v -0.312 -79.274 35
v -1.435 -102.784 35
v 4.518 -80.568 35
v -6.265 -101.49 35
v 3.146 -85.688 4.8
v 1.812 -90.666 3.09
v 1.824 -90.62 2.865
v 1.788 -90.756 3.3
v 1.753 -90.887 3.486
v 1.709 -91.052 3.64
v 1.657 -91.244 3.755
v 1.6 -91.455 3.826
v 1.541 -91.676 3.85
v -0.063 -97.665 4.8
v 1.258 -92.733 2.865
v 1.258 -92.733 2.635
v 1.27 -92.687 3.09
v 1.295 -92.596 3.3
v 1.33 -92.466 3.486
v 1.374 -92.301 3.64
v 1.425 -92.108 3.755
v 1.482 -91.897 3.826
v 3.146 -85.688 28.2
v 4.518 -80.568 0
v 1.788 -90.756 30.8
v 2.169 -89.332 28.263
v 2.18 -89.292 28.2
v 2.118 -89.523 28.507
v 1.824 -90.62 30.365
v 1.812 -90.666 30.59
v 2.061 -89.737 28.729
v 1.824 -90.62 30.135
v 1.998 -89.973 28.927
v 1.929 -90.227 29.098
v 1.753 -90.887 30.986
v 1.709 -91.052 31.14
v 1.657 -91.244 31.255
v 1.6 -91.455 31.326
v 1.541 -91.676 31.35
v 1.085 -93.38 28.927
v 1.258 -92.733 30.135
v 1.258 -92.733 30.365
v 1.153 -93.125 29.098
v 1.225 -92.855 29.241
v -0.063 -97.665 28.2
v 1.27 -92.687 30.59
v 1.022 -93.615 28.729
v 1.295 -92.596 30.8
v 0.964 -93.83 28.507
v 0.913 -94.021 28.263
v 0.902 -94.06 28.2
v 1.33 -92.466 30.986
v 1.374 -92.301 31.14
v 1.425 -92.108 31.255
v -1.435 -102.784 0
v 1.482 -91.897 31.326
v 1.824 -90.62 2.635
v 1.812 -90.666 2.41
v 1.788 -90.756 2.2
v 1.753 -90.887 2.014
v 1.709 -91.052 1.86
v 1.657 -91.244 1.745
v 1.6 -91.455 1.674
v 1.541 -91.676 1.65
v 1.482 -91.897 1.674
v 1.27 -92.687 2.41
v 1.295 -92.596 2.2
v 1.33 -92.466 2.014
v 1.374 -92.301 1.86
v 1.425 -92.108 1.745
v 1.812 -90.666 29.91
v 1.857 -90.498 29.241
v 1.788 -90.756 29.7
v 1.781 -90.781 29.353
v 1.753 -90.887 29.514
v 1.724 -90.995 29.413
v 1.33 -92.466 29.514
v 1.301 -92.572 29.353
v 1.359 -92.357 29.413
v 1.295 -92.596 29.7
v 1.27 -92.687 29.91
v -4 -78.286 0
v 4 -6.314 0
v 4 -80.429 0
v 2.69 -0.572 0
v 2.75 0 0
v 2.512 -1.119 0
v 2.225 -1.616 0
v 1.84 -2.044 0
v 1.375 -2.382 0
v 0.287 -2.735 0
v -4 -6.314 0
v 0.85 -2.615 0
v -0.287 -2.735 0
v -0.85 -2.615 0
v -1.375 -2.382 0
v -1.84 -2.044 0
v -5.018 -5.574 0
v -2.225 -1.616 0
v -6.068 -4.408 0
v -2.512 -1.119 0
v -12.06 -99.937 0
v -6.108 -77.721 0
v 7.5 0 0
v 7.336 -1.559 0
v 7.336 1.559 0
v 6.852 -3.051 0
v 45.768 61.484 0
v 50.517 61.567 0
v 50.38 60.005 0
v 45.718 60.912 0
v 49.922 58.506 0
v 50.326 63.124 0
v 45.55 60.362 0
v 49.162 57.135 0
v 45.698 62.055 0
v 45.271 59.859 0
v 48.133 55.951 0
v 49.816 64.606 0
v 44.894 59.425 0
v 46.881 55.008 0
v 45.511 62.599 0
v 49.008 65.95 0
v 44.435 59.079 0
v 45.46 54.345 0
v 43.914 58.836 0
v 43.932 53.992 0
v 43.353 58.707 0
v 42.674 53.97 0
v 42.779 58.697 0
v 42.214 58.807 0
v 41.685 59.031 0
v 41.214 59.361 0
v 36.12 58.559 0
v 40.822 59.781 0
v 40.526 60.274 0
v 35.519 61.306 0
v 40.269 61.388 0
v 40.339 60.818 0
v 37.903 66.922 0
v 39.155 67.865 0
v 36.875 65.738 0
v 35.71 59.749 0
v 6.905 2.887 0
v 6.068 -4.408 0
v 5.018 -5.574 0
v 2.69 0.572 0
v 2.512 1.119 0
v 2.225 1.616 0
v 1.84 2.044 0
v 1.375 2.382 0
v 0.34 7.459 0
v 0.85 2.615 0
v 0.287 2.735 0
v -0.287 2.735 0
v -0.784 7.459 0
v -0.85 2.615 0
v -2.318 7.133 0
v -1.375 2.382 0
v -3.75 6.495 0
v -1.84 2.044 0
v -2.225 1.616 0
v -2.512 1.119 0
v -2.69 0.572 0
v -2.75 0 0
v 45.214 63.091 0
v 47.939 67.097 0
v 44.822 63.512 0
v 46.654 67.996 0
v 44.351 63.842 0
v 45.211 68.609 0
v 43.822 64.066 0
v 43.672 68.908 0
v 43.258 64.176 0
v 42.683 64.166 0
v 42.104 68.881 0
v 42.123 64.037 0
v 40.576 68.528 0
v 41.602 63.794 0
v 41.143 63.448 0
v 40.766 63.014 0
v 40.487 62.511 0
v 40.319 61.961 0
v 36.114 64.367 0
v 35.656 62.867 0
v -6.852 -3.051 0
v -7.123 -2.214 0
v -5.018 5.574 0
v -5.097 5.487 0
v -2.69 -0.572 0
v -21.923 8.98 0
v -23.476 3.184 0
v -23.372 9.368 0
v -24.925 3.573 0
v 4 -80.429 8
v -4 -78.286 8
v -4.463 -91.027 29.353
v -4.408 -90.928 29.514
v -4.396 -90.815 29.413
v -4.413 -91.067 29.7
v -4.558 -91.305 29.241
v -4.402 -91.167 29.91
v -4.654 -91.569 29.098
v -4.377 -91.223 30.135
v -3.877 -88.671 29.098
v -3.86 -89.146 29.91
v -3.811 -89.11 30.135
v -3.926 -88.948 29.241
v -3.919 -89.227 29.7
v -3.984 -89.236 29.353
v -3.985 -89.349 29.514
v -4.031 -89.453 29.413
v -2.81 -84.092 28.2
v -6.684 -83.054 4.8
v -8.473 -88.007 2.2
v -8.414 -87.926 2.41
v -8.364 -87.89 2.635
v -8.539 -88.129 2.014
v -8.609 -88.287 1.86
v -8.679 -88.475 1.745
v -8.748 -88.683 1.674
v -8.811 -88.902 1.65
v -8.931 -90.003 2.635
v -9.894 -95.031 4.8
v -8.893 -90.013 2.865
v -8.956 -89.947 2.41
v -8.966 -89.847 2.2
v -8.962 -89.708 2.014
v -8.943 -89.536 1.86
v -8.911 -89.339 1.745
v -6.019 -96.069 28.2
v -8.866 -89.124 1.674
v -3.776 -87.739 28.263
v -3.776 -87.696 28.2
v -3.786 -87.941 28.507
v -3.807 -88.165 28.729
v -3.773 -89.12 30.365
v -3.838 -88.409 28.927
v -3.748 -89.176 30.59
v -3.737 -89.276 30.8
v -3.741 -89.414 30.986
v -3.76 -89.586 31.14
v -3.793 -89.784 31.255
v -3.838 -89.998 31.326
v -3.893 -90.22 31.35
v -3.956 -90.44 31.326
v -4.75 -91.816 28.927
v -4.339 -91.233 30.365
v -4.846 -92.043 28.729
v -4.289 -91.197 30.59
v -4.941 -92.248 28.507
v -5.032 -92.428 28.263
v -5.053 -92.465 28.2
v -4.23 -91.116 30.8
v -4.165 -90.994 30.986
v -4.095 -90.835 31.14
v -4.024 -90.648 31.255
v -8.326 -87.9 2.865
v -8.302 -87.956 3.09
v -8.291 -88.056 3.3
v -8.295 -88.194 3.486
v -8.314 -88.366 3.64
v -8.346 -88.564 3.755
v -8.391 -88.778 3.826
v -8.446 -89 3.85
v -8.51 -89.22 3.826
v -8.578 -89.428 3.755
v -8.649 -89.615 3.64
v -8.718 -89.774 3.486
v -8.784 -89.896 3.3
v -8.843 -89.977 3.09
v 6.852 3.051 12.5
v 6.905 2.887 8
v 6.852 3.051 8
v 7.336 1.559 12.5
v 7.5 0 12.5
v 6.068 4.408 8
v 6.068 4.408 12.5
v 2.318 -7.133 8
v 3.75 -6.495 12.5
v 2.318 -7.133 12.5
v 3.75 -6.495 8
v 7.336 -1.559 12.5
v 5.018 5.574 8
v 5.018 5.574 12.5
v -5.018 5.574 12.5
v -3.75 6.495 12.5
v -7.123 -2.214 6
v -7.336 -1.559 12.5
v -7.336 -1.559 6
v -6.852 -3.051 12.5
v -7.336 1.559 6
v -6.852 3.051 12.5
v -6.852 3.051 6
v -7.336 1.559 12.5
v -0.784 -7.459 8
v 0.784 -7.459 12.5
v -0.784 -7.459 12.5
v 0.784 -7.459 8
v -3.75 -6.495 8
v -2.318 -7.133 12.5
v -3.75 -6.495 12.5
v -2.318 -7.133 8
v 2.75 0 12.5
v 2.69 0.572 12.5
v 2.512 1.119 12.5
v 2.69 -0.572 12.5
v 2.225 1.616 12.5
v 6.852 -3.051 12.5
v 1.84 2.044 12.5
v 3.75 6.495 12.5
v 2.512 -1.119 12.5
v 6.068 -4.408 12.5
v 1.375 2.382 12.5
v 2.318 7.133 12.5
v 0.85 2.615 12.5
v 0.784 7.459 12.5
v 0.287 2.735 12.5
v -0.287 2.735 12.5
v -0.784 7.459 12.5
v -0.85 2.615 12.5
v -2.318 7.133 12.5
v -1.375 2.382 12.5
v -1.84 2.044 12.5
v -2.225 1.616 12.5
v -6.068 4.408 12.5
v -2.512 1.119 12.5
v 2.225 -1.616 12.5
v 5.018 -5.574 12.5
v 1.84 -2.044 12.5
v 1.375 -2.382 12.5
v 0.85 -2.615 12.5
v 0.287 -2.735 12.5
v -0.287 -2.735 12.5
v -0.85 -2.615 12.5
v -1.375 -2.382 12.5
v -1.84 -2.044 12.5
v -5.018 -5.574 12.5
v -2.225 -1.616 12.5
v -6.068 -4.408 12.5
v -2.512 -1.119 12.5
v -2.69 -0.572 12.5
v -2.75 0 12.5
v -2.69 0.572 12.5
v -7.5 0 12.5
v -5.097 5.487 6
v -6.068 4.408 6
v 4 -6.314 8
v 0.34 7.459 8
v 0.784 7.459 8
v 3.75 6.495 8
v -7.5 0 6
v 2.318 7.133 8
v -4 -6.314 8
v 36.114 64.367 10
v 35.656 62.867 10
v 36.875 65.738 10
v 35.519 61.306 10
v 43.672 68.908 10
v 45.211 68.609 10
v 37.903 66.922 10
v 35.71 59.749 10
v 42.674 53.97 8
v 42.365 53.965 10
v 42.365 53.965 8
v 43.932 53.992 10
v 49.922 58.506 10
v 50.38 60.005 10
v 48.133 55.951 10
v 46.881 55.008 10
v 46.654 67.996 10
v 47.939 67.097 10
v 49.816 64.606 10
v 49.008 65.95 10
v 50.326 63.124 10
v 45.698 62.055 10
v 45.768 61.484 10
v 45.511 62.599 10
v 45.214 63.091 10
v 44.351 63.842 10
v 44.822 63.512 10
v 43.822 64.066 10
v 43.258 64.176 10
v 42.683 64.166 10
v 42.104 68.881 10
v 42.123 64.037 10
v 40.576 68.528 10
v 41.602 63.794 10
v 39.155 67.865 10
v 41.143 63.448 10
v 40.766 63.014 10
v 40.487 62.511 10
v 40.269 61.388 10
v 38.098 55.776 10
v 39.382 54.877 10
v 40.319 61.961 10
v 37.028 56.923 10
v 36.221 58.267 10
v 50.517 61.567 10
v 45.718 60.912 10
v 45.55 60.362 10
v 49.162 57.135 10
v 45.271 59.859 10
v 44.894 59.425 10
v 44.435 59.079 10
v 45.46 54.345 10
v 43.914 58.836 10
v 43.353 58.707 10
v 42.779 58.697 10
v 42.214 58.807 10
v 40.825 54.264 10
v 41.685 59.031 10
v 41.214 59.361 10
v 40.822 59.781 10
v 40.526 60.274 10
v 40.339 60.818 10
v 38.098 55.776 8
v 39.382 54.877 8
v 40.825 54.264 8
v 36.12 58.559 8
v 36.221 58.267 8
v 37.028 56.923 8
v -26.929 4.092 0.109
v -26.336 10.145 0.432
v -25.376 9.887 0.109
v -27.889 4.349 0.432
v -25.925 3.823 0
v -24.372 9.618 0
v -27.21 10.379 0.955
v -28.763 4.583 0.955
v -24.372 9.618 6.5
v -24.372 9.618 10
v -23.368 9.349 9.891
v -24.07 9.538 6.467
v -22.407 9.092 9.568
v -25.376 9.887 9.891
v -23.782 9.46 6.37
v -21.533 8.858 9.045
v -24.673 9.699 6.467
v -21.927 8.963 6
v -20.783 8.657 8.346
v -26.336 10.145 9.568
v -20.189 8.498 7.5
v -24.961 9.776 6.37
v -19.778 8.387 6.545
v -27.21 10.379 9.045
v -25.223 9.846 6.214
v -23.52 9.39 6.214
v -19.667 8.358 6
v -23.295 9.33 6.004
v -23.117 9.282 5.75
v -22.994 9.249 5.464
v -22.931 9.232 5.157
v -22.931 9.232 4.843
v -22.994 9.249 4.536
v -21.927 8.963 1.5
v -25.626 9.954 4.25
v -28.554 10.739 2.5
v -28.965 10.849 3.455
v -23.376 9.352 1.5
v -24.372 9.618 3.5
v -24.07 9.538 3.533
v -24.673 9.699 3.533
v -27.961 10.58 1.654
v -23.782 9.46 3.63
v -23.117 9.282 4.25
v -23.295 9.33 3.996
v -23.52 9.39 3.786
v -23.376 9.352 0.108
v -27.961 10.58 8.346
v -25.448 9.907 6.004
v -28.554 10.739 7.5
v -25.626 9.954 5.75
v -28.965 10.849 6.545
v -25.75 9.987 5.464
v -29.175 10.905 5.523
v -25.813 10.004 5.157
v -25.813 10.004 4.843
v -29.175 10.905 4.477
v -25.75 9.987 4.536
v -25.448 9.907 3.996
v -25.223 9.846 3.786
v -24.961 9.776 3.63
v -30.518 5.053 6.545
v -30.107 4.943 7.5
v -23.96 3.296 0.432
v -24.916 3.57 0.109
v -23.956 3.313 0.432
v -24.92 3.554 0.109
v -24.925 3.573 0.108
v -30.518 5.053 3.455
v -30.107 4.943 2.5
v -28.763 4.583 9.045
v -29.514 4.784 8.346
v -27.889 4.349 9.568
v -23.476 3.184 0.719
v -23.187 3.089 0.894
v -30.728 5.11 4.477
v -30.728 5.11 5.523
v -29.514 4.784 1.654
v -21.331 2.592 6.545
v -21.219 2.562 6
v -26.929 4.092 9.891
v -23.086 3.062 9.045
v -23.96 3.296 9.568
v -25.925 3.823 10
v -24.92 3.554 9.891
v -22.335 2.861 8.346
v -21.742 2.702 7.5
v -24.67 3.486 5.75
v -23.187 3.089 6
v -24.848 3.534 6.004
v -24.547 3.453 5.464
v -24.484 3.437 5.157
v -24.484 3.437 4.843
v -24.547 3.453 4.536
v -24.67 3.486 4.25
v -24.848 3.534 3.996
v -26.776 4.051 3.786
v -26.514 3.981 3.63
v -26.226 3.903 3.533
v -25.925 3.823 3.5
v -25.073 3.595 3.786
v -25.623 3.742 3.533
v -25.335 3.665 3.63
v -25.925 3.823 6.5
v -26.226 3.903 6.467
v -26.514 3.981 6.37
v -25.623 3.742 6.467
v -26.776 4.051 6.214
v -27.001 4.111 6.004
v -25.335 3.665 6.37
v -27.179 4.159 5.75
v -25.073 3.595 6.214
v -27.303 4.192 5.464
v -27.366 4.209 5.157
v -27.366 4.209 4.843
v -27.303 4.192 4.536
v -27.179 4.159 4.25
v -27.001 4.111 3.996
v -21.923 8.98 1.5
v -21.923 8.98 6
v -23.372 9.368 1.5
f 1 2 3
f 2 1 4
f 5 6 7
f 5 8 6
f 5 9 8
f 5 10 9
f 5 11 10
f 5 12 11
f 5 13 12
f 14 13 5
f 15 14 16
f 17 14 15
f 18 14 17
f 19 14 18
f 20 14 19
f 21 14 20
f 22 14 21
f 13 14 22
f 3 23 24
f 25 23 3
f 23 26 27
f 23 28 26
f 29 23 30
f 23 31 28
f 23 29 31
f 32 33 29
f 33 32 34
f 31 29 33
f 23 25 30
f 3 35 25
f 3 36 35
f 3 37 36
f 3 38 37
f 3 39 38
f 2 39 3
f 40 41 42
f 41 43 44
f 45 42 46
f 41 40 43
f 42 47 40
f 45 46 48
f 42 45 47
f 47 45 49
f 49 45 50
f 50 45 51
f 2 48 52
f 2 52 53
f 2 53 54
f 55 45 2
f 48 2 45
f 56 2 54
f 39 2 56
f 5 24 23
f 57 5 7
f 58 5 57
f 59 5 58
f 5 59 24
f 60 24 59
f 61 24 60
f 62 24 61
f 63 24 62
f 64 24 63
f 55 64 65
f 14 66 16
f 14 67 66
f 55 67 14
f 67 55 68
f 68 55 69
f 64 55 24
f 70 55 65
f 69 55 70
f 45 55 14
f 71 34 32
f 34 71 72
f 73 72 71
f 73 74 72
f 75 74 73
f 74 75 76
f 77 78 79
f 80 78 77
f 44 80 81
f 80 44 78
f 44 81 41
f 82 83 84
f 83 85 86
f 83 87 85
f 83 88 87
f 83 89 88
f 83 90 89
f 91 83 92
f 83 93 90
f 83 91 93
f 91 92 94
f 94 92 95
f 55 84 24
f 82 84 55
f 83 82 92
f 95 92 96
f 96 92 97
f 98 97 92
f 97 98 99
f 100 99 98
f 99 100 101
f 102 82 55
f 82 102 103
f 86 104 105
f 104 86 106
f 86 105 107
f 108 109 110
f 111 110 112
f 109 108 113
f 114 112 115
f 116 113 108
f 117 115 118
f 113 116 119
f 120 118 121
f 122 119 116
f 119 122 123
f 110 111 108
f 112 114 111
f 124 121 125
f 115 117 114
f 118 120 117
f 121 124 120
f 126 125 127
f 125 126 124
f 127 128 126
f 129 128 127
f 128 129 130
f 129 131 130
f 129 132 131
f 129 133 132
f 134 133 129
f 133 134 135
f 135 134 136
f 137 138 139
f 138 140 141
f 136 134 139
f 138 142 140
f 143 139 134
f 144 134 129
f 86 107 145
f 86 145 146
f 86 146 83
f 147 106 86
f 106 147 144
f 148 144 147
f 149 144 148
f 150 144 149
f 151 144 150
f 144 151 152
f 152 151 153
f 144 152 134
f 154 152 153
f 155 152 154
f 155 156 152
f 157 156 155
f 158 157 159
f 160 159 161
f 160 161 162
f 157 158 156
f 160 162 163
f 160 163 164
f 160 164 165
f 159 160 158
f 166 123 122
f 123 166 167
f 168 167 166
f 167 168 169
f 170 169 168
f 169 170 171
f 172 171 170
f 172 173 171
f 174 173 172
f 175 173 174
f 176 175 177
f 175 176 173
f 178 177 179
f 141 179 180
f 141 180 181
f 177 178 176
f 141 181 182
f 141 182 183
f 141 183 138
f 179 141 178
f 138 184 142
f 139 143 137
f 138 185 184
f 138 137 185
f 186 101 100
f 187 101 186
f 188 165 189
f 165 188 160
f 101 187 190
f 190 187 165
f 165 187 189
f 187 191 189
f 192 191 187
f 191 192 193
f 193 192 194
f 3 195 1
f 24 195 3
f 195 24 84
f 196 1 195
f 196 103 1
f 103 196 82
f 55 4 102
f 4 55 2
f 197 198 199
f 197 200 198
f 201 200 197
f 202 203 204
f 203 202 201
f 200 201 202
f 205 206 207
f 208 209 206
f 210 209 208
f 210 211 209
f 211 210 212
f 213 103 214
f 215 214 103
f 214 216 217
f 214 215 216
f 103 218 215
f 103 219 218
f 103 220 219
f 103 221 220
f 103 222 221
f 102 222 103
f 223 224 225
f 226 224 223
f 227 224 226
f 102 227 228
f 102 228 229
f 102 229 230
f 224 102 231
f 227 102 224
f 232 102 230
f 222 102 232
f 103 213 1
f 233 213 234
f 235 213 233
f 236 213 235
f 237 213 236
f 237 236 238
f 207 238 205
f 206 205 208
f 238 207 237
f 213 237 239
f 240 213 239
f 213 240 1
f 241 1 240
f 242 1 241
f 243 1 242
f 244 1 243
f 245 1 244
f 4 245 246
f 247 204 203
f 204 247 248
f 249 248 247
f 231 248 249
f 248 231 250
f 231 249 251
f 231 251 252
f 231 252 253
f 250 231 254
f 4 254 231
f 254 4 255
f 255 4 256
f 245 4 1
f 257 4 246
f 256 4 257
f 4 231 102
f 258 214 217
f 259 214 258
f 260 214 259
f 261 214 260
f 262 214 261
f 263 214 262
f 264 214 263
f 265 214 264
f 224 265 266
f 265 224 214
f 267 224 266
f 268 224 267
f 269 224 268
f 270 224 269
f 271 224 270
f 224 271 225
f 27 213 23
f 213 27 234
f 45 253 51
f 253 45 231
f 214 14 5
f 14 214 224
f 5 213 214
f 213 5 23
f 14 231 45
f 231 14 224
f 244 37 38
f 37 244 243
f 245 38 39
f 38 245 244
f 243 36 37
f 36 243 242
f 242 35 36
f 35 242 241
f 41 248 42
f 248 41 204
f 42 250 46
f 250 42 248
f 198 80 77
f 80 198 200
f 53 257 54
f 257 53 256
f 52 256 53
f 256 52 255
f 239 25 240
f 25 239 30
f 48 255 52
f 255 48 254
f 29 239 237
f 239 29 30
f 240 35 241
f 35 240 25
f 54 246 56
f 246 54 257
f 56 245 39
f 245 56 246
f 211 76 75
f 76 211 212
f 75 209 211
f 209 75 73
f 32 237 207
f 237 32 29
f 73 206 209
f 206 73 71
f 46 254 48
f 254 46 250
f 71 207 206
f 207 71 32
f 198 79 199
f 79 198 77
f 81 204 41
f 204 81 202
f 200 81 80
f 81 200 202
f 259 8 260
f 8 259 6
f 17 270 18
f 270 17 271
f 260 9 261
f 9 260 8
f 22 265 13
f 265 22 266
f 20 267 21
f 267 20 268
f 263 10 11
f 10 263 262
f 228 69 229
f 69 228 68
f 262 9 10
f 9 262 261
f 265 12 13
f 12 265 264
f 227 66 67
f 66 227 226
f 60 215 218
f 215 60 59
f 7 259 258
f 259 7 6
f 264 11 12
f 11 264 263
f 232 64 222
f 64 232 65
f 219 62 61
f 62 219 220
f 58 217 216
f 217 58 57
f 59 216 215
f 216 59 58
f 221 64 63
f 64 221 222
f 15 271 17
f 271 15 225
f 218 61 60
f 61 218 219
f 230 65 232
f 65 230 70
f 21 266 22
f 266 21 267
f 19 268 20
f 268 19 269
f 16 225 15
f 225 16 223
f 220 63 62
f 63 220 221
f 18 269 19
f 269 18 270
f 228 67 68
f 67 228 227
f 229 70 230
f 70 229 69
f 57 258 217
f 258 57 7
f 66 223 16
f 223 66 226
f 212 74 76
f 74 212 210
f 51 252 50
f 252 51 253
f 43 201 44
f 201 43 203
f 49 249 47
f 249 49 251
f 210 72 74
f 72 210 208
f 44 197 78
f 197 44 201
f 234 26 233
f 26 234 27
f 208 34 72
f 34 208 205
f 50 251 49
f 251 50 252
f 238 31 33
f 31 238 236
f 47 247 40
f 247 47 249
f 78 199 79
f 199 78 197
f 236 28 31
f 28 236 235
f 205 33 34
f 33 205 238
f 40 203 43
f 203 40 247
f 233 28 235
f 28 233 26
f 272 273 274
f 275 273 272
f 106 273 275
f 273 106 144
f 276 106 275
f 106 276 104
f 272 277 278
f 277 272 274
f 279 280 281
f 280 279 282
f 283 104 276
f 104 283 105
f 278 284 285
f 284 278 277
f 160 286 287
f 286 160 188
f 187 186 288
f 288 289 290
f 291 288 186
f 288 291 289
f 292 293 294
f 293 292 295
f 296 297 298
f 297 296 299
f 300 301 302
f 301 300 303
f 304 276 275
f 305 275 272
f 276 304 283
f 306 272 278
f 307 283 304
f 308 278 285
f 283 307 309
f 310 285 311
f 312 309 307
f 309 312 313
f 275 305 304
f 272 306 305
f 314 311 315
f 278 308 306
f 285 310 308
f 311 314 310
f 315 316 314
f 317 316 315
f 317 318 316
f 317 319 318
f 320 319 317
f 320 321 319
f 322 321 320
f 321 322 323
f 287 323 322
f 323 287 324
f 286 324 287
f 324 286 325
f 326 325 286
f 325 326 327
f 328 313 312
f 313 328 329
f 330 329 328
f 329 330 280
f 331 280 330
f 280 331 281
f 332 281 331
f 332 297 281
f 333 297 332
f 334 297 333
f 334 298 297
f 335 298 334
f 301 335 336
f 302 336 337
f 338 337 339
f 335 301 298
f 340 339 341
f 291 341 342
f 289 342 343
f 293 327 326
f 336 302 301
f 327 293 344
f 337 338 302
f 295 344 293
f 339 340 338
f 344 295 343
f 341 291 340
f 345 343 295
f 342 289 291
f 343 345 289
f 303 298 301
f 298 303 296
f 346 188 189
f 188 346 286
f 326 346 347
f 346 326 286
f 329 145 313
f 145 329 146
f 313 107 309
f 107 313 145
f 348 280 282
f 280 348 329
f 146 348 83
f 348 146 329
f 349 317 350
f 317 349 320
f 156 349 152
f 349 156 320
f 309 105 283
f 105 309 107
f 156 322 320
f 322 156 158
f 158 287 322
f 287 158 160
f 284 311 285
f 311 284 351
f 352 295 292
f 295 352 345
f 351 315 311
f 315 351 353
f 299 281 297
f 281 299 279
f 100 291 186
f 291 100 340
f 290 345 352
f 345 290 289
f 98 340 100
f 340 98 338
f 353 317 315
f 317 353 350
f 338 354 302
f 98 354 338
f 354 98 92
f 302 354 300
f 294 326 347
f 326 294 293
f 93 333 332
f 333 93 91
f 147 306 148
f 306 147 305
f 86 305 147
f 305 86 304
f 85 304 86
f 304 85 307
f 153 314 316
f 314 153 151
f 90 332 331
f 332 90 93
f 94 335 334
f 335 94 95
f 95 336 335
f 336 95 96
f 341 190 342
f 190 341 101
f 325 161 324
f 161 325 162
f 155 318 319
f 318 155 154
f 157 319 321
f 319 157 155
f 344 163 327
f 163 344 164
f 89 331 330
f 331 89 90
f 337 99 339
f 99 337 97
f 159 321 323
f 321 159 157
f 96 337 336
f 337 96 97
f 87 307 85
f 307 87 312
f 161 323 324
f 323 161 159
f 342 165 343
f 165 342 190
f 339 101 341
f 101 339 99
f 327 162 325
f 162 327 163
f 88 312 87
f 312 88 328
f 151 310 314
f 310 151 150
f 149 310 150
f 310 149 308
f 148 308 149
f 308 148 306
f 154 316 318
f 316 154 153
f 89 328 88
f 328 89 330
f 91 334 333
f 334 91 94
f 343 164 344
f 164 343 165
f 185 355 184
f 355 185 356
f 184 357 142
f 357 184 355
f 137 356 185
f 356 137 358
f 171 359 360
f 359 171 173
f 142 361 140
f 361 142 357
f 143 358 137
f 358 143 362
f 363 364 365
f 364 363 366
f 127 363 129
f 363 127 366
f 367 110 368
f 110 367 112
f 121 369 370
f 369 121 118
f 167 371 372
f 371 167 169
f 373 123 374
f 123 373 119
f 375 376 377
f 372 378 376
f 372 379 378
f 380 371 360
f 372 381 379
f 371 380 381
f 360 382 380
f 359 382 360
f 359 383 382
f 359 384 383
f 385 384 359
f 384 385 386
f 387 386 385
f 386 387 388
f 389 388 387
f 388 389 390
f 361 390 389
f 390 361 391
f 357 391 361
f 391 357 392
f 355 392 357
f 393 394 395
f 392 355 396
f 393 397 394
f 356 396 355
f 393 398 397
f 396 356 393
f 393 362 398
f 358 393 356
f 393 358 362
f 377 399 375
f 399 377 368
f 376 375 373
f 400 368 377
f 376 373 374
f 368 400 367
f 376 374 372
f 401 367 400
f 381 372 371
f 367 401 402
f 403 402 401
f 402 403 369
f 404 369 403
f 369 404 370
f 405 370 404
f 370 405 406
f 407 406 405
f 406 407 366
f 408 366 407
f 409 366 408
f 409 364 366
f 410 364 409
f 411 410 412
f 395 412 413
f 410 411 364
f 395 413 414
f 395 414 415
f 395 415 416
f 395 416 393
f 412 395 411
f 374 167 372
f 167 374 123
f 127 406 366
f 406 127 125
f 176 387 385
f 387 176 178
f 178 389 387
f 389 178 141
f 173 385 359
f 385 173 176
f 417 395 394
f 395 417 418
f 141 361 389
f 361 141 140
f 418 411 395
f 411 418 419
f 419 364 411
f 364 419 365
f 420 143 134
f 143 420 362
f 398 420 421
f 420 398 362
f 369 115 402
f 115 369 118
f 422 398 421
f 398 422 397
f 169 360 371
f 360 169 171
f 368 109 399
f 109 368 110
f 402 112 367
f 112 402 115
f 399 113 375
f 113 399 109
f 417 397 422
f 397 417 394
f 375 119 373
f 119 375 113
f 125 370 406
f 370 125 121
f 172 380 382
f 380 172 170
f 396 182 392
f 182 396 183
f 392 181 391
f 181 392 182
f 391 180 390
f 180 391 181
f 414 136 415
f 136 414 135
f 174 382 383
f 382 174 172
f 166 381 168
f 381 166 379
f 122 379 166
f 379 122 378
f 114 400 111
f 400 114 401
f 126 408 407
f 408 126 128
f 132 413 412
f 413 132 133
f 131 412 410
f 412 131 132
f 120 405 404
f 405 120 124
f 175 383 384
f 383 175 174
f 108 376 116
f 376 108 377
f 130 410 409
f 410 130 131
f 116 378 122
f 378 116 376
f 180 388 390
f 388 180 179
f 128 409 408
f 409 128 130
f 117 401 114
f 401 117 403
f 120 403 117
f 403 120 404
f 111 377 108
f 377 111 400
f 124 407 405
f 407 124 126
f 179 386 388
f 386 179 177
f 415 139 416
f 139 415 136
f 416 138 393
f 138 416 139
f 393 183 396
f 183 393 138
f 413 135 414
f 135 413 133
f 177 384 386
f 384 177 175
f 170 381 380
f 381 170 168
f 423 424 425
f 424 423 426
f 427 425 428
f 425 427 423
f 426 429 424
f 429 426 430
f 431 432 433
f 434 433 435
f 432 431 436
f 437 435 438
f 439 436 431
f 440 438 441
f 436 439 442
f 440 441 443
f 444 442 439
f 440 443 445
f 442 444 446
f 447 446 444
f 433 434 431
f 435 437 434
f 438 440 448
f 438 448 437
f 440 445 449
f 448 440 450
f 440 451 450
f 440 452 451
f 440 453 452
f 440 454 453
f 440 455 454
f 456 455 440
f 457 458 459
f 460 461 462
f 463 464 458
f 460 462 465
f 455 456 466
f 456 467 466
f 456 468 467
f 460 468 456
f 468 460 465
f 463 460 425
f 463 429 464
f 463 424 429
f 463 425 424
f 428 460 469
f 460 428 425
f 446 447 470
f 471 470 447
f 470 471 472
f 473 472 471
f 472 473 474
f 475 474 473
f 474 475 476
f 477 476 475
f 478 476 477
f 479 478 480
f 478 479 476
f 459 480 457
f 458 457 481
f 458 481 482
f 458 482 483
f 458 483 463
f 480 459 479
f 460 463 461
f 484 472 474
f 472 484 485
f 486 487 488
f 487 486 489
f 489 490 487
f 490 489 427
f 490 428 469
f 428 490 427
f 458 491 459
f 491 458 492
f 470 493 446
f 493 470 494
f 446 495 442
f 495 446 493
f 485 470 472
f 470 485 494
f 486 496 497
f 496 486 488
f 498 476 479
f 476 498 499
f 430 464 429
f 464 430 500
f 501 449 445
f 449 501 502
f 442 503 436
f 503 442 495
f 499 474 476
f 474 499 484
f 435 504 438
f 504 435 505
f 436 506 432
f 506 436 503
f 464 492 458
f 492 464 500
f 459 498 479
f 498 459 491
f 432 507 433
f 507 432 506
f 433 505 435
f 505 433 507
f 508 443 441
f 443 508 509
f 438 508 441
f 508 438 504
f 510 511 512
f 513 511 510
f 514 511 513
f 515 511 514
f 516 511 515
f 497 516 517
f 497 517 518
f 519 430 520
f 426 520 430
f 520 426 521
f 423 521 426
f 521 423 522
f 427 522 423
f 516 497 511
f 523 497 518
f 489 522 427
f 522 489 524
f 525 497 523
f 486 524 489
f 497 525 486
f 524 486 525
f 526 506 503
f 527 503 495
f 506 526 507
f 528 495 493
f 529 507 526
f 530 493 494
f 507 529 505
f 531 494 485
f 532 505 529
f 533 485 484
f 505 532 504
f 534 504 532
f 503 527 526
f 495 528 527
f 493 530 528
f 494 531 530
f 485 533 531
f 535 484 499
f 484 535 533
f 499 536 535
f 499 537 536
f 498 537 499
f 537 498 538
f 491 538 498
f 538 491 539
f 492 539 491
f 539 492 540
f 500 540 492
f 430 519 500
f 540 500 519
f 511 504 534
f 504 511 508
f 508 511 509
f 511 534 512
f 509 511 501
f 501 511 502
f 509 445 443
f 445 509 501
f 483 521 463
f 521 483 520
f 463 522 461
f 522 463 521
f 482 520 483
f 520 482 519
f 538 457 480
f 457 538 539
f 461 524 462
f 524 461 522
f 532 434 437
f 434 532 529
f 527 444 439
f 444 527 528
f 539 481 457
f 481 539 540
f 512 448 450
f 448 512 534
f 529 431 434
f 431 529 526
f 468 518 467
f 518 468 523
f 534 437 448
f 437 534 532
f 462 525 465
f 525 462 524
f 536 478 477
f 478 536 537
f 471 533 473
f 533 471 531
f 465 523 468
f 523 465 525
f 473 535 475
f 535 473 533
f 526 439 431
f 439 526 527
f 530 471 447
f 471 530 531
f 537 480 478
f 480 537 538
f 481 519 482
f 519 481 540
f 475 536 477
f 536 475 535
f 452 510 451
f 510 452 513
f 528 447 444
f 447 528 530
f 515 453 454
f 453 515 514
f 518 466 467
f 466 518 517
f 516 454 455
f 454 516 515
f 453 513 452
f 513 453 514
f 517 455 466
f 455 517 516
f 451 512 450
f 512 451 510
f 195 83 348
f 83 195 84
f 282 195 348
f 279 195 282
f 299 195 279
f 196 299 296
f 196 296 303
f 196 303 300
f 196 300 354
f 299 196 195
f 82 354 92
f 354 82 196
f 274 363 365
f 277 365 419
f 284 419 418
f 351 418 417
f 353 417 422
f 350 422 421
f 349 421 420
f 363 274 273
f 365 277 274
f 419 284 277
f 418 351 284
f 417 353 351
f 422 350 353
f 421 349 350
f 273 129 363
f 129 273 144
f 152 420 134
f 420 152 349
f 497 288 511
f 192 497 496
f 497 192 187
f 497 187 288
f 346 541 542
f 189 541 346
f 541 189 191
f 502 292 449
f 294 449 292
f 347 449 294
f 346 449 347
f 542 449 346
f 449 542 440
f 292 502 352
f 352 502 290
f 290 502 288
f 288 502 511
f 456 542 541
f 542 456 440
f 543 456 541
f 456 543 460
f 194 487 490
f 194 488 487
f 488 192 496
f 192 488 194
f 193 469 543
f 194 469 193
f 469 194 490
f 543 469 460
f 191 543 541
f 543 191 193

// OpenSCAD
$fn=30;

translate([4,-82.5,0])rotate([0,-90,-15])
translate([16.5,-9.5,0])
servo_bracket();

translate([-4,-82.5,0])cube([8,78.5,8]);

difference(){
cylinder(d=15,h=12.5);
translate([0,0,-1])cylinder(d=5.5,h=14);
}

rotate([0,0,145])
translate([-4,-70,0])cube([8,64.5,8]);

rotate([0,0,145])translate([0,-75,0])
difference(){
cylinder(d=15,h=10);
translate([0,0,-1])cylinder(d=5.5,h=12);
}

rotate([0,0,75]) translate([0,6,0])
linear_extrude(height=6)
polygon([[-4,0],[4,0],[3,17.5],[-3,17.5]]);

rotate([0,0,75]) translate([-3,19,0])
cube([6,6,1.5]);

translate([-1,0.25,5])rotate([0,0,75]) 
translate([0,25,0])rotate([0,90,0])
difference(){
cylinder(d=10,h=6,center=true);
cylinder(d=3,h=7,center=true);
}

module servo_bracket(){
difference(){
union(){
translate([1,0,2.5])cube([35,23,5],center=true);
translate([0,11.5,3])
rotate([90,0,0])linear_extrude(height=23)
polygon([[-16.5,0],[18.5,2],[-16.5,8]]);
translate([13.75,0,0])cylinder(d=8,h=2,$fn=60);
}
cube([23.4,12.4,50],center=true);
translate([13.75,0,-1])cylinder(d=2.2,h=50,$fn=30);
translate([-13.75,0,-1])cylinder(d=2.2,h=50,$fn=30);
translate([10,0,0])cylinder(d=6,h=12,$fn=60);
}
}
